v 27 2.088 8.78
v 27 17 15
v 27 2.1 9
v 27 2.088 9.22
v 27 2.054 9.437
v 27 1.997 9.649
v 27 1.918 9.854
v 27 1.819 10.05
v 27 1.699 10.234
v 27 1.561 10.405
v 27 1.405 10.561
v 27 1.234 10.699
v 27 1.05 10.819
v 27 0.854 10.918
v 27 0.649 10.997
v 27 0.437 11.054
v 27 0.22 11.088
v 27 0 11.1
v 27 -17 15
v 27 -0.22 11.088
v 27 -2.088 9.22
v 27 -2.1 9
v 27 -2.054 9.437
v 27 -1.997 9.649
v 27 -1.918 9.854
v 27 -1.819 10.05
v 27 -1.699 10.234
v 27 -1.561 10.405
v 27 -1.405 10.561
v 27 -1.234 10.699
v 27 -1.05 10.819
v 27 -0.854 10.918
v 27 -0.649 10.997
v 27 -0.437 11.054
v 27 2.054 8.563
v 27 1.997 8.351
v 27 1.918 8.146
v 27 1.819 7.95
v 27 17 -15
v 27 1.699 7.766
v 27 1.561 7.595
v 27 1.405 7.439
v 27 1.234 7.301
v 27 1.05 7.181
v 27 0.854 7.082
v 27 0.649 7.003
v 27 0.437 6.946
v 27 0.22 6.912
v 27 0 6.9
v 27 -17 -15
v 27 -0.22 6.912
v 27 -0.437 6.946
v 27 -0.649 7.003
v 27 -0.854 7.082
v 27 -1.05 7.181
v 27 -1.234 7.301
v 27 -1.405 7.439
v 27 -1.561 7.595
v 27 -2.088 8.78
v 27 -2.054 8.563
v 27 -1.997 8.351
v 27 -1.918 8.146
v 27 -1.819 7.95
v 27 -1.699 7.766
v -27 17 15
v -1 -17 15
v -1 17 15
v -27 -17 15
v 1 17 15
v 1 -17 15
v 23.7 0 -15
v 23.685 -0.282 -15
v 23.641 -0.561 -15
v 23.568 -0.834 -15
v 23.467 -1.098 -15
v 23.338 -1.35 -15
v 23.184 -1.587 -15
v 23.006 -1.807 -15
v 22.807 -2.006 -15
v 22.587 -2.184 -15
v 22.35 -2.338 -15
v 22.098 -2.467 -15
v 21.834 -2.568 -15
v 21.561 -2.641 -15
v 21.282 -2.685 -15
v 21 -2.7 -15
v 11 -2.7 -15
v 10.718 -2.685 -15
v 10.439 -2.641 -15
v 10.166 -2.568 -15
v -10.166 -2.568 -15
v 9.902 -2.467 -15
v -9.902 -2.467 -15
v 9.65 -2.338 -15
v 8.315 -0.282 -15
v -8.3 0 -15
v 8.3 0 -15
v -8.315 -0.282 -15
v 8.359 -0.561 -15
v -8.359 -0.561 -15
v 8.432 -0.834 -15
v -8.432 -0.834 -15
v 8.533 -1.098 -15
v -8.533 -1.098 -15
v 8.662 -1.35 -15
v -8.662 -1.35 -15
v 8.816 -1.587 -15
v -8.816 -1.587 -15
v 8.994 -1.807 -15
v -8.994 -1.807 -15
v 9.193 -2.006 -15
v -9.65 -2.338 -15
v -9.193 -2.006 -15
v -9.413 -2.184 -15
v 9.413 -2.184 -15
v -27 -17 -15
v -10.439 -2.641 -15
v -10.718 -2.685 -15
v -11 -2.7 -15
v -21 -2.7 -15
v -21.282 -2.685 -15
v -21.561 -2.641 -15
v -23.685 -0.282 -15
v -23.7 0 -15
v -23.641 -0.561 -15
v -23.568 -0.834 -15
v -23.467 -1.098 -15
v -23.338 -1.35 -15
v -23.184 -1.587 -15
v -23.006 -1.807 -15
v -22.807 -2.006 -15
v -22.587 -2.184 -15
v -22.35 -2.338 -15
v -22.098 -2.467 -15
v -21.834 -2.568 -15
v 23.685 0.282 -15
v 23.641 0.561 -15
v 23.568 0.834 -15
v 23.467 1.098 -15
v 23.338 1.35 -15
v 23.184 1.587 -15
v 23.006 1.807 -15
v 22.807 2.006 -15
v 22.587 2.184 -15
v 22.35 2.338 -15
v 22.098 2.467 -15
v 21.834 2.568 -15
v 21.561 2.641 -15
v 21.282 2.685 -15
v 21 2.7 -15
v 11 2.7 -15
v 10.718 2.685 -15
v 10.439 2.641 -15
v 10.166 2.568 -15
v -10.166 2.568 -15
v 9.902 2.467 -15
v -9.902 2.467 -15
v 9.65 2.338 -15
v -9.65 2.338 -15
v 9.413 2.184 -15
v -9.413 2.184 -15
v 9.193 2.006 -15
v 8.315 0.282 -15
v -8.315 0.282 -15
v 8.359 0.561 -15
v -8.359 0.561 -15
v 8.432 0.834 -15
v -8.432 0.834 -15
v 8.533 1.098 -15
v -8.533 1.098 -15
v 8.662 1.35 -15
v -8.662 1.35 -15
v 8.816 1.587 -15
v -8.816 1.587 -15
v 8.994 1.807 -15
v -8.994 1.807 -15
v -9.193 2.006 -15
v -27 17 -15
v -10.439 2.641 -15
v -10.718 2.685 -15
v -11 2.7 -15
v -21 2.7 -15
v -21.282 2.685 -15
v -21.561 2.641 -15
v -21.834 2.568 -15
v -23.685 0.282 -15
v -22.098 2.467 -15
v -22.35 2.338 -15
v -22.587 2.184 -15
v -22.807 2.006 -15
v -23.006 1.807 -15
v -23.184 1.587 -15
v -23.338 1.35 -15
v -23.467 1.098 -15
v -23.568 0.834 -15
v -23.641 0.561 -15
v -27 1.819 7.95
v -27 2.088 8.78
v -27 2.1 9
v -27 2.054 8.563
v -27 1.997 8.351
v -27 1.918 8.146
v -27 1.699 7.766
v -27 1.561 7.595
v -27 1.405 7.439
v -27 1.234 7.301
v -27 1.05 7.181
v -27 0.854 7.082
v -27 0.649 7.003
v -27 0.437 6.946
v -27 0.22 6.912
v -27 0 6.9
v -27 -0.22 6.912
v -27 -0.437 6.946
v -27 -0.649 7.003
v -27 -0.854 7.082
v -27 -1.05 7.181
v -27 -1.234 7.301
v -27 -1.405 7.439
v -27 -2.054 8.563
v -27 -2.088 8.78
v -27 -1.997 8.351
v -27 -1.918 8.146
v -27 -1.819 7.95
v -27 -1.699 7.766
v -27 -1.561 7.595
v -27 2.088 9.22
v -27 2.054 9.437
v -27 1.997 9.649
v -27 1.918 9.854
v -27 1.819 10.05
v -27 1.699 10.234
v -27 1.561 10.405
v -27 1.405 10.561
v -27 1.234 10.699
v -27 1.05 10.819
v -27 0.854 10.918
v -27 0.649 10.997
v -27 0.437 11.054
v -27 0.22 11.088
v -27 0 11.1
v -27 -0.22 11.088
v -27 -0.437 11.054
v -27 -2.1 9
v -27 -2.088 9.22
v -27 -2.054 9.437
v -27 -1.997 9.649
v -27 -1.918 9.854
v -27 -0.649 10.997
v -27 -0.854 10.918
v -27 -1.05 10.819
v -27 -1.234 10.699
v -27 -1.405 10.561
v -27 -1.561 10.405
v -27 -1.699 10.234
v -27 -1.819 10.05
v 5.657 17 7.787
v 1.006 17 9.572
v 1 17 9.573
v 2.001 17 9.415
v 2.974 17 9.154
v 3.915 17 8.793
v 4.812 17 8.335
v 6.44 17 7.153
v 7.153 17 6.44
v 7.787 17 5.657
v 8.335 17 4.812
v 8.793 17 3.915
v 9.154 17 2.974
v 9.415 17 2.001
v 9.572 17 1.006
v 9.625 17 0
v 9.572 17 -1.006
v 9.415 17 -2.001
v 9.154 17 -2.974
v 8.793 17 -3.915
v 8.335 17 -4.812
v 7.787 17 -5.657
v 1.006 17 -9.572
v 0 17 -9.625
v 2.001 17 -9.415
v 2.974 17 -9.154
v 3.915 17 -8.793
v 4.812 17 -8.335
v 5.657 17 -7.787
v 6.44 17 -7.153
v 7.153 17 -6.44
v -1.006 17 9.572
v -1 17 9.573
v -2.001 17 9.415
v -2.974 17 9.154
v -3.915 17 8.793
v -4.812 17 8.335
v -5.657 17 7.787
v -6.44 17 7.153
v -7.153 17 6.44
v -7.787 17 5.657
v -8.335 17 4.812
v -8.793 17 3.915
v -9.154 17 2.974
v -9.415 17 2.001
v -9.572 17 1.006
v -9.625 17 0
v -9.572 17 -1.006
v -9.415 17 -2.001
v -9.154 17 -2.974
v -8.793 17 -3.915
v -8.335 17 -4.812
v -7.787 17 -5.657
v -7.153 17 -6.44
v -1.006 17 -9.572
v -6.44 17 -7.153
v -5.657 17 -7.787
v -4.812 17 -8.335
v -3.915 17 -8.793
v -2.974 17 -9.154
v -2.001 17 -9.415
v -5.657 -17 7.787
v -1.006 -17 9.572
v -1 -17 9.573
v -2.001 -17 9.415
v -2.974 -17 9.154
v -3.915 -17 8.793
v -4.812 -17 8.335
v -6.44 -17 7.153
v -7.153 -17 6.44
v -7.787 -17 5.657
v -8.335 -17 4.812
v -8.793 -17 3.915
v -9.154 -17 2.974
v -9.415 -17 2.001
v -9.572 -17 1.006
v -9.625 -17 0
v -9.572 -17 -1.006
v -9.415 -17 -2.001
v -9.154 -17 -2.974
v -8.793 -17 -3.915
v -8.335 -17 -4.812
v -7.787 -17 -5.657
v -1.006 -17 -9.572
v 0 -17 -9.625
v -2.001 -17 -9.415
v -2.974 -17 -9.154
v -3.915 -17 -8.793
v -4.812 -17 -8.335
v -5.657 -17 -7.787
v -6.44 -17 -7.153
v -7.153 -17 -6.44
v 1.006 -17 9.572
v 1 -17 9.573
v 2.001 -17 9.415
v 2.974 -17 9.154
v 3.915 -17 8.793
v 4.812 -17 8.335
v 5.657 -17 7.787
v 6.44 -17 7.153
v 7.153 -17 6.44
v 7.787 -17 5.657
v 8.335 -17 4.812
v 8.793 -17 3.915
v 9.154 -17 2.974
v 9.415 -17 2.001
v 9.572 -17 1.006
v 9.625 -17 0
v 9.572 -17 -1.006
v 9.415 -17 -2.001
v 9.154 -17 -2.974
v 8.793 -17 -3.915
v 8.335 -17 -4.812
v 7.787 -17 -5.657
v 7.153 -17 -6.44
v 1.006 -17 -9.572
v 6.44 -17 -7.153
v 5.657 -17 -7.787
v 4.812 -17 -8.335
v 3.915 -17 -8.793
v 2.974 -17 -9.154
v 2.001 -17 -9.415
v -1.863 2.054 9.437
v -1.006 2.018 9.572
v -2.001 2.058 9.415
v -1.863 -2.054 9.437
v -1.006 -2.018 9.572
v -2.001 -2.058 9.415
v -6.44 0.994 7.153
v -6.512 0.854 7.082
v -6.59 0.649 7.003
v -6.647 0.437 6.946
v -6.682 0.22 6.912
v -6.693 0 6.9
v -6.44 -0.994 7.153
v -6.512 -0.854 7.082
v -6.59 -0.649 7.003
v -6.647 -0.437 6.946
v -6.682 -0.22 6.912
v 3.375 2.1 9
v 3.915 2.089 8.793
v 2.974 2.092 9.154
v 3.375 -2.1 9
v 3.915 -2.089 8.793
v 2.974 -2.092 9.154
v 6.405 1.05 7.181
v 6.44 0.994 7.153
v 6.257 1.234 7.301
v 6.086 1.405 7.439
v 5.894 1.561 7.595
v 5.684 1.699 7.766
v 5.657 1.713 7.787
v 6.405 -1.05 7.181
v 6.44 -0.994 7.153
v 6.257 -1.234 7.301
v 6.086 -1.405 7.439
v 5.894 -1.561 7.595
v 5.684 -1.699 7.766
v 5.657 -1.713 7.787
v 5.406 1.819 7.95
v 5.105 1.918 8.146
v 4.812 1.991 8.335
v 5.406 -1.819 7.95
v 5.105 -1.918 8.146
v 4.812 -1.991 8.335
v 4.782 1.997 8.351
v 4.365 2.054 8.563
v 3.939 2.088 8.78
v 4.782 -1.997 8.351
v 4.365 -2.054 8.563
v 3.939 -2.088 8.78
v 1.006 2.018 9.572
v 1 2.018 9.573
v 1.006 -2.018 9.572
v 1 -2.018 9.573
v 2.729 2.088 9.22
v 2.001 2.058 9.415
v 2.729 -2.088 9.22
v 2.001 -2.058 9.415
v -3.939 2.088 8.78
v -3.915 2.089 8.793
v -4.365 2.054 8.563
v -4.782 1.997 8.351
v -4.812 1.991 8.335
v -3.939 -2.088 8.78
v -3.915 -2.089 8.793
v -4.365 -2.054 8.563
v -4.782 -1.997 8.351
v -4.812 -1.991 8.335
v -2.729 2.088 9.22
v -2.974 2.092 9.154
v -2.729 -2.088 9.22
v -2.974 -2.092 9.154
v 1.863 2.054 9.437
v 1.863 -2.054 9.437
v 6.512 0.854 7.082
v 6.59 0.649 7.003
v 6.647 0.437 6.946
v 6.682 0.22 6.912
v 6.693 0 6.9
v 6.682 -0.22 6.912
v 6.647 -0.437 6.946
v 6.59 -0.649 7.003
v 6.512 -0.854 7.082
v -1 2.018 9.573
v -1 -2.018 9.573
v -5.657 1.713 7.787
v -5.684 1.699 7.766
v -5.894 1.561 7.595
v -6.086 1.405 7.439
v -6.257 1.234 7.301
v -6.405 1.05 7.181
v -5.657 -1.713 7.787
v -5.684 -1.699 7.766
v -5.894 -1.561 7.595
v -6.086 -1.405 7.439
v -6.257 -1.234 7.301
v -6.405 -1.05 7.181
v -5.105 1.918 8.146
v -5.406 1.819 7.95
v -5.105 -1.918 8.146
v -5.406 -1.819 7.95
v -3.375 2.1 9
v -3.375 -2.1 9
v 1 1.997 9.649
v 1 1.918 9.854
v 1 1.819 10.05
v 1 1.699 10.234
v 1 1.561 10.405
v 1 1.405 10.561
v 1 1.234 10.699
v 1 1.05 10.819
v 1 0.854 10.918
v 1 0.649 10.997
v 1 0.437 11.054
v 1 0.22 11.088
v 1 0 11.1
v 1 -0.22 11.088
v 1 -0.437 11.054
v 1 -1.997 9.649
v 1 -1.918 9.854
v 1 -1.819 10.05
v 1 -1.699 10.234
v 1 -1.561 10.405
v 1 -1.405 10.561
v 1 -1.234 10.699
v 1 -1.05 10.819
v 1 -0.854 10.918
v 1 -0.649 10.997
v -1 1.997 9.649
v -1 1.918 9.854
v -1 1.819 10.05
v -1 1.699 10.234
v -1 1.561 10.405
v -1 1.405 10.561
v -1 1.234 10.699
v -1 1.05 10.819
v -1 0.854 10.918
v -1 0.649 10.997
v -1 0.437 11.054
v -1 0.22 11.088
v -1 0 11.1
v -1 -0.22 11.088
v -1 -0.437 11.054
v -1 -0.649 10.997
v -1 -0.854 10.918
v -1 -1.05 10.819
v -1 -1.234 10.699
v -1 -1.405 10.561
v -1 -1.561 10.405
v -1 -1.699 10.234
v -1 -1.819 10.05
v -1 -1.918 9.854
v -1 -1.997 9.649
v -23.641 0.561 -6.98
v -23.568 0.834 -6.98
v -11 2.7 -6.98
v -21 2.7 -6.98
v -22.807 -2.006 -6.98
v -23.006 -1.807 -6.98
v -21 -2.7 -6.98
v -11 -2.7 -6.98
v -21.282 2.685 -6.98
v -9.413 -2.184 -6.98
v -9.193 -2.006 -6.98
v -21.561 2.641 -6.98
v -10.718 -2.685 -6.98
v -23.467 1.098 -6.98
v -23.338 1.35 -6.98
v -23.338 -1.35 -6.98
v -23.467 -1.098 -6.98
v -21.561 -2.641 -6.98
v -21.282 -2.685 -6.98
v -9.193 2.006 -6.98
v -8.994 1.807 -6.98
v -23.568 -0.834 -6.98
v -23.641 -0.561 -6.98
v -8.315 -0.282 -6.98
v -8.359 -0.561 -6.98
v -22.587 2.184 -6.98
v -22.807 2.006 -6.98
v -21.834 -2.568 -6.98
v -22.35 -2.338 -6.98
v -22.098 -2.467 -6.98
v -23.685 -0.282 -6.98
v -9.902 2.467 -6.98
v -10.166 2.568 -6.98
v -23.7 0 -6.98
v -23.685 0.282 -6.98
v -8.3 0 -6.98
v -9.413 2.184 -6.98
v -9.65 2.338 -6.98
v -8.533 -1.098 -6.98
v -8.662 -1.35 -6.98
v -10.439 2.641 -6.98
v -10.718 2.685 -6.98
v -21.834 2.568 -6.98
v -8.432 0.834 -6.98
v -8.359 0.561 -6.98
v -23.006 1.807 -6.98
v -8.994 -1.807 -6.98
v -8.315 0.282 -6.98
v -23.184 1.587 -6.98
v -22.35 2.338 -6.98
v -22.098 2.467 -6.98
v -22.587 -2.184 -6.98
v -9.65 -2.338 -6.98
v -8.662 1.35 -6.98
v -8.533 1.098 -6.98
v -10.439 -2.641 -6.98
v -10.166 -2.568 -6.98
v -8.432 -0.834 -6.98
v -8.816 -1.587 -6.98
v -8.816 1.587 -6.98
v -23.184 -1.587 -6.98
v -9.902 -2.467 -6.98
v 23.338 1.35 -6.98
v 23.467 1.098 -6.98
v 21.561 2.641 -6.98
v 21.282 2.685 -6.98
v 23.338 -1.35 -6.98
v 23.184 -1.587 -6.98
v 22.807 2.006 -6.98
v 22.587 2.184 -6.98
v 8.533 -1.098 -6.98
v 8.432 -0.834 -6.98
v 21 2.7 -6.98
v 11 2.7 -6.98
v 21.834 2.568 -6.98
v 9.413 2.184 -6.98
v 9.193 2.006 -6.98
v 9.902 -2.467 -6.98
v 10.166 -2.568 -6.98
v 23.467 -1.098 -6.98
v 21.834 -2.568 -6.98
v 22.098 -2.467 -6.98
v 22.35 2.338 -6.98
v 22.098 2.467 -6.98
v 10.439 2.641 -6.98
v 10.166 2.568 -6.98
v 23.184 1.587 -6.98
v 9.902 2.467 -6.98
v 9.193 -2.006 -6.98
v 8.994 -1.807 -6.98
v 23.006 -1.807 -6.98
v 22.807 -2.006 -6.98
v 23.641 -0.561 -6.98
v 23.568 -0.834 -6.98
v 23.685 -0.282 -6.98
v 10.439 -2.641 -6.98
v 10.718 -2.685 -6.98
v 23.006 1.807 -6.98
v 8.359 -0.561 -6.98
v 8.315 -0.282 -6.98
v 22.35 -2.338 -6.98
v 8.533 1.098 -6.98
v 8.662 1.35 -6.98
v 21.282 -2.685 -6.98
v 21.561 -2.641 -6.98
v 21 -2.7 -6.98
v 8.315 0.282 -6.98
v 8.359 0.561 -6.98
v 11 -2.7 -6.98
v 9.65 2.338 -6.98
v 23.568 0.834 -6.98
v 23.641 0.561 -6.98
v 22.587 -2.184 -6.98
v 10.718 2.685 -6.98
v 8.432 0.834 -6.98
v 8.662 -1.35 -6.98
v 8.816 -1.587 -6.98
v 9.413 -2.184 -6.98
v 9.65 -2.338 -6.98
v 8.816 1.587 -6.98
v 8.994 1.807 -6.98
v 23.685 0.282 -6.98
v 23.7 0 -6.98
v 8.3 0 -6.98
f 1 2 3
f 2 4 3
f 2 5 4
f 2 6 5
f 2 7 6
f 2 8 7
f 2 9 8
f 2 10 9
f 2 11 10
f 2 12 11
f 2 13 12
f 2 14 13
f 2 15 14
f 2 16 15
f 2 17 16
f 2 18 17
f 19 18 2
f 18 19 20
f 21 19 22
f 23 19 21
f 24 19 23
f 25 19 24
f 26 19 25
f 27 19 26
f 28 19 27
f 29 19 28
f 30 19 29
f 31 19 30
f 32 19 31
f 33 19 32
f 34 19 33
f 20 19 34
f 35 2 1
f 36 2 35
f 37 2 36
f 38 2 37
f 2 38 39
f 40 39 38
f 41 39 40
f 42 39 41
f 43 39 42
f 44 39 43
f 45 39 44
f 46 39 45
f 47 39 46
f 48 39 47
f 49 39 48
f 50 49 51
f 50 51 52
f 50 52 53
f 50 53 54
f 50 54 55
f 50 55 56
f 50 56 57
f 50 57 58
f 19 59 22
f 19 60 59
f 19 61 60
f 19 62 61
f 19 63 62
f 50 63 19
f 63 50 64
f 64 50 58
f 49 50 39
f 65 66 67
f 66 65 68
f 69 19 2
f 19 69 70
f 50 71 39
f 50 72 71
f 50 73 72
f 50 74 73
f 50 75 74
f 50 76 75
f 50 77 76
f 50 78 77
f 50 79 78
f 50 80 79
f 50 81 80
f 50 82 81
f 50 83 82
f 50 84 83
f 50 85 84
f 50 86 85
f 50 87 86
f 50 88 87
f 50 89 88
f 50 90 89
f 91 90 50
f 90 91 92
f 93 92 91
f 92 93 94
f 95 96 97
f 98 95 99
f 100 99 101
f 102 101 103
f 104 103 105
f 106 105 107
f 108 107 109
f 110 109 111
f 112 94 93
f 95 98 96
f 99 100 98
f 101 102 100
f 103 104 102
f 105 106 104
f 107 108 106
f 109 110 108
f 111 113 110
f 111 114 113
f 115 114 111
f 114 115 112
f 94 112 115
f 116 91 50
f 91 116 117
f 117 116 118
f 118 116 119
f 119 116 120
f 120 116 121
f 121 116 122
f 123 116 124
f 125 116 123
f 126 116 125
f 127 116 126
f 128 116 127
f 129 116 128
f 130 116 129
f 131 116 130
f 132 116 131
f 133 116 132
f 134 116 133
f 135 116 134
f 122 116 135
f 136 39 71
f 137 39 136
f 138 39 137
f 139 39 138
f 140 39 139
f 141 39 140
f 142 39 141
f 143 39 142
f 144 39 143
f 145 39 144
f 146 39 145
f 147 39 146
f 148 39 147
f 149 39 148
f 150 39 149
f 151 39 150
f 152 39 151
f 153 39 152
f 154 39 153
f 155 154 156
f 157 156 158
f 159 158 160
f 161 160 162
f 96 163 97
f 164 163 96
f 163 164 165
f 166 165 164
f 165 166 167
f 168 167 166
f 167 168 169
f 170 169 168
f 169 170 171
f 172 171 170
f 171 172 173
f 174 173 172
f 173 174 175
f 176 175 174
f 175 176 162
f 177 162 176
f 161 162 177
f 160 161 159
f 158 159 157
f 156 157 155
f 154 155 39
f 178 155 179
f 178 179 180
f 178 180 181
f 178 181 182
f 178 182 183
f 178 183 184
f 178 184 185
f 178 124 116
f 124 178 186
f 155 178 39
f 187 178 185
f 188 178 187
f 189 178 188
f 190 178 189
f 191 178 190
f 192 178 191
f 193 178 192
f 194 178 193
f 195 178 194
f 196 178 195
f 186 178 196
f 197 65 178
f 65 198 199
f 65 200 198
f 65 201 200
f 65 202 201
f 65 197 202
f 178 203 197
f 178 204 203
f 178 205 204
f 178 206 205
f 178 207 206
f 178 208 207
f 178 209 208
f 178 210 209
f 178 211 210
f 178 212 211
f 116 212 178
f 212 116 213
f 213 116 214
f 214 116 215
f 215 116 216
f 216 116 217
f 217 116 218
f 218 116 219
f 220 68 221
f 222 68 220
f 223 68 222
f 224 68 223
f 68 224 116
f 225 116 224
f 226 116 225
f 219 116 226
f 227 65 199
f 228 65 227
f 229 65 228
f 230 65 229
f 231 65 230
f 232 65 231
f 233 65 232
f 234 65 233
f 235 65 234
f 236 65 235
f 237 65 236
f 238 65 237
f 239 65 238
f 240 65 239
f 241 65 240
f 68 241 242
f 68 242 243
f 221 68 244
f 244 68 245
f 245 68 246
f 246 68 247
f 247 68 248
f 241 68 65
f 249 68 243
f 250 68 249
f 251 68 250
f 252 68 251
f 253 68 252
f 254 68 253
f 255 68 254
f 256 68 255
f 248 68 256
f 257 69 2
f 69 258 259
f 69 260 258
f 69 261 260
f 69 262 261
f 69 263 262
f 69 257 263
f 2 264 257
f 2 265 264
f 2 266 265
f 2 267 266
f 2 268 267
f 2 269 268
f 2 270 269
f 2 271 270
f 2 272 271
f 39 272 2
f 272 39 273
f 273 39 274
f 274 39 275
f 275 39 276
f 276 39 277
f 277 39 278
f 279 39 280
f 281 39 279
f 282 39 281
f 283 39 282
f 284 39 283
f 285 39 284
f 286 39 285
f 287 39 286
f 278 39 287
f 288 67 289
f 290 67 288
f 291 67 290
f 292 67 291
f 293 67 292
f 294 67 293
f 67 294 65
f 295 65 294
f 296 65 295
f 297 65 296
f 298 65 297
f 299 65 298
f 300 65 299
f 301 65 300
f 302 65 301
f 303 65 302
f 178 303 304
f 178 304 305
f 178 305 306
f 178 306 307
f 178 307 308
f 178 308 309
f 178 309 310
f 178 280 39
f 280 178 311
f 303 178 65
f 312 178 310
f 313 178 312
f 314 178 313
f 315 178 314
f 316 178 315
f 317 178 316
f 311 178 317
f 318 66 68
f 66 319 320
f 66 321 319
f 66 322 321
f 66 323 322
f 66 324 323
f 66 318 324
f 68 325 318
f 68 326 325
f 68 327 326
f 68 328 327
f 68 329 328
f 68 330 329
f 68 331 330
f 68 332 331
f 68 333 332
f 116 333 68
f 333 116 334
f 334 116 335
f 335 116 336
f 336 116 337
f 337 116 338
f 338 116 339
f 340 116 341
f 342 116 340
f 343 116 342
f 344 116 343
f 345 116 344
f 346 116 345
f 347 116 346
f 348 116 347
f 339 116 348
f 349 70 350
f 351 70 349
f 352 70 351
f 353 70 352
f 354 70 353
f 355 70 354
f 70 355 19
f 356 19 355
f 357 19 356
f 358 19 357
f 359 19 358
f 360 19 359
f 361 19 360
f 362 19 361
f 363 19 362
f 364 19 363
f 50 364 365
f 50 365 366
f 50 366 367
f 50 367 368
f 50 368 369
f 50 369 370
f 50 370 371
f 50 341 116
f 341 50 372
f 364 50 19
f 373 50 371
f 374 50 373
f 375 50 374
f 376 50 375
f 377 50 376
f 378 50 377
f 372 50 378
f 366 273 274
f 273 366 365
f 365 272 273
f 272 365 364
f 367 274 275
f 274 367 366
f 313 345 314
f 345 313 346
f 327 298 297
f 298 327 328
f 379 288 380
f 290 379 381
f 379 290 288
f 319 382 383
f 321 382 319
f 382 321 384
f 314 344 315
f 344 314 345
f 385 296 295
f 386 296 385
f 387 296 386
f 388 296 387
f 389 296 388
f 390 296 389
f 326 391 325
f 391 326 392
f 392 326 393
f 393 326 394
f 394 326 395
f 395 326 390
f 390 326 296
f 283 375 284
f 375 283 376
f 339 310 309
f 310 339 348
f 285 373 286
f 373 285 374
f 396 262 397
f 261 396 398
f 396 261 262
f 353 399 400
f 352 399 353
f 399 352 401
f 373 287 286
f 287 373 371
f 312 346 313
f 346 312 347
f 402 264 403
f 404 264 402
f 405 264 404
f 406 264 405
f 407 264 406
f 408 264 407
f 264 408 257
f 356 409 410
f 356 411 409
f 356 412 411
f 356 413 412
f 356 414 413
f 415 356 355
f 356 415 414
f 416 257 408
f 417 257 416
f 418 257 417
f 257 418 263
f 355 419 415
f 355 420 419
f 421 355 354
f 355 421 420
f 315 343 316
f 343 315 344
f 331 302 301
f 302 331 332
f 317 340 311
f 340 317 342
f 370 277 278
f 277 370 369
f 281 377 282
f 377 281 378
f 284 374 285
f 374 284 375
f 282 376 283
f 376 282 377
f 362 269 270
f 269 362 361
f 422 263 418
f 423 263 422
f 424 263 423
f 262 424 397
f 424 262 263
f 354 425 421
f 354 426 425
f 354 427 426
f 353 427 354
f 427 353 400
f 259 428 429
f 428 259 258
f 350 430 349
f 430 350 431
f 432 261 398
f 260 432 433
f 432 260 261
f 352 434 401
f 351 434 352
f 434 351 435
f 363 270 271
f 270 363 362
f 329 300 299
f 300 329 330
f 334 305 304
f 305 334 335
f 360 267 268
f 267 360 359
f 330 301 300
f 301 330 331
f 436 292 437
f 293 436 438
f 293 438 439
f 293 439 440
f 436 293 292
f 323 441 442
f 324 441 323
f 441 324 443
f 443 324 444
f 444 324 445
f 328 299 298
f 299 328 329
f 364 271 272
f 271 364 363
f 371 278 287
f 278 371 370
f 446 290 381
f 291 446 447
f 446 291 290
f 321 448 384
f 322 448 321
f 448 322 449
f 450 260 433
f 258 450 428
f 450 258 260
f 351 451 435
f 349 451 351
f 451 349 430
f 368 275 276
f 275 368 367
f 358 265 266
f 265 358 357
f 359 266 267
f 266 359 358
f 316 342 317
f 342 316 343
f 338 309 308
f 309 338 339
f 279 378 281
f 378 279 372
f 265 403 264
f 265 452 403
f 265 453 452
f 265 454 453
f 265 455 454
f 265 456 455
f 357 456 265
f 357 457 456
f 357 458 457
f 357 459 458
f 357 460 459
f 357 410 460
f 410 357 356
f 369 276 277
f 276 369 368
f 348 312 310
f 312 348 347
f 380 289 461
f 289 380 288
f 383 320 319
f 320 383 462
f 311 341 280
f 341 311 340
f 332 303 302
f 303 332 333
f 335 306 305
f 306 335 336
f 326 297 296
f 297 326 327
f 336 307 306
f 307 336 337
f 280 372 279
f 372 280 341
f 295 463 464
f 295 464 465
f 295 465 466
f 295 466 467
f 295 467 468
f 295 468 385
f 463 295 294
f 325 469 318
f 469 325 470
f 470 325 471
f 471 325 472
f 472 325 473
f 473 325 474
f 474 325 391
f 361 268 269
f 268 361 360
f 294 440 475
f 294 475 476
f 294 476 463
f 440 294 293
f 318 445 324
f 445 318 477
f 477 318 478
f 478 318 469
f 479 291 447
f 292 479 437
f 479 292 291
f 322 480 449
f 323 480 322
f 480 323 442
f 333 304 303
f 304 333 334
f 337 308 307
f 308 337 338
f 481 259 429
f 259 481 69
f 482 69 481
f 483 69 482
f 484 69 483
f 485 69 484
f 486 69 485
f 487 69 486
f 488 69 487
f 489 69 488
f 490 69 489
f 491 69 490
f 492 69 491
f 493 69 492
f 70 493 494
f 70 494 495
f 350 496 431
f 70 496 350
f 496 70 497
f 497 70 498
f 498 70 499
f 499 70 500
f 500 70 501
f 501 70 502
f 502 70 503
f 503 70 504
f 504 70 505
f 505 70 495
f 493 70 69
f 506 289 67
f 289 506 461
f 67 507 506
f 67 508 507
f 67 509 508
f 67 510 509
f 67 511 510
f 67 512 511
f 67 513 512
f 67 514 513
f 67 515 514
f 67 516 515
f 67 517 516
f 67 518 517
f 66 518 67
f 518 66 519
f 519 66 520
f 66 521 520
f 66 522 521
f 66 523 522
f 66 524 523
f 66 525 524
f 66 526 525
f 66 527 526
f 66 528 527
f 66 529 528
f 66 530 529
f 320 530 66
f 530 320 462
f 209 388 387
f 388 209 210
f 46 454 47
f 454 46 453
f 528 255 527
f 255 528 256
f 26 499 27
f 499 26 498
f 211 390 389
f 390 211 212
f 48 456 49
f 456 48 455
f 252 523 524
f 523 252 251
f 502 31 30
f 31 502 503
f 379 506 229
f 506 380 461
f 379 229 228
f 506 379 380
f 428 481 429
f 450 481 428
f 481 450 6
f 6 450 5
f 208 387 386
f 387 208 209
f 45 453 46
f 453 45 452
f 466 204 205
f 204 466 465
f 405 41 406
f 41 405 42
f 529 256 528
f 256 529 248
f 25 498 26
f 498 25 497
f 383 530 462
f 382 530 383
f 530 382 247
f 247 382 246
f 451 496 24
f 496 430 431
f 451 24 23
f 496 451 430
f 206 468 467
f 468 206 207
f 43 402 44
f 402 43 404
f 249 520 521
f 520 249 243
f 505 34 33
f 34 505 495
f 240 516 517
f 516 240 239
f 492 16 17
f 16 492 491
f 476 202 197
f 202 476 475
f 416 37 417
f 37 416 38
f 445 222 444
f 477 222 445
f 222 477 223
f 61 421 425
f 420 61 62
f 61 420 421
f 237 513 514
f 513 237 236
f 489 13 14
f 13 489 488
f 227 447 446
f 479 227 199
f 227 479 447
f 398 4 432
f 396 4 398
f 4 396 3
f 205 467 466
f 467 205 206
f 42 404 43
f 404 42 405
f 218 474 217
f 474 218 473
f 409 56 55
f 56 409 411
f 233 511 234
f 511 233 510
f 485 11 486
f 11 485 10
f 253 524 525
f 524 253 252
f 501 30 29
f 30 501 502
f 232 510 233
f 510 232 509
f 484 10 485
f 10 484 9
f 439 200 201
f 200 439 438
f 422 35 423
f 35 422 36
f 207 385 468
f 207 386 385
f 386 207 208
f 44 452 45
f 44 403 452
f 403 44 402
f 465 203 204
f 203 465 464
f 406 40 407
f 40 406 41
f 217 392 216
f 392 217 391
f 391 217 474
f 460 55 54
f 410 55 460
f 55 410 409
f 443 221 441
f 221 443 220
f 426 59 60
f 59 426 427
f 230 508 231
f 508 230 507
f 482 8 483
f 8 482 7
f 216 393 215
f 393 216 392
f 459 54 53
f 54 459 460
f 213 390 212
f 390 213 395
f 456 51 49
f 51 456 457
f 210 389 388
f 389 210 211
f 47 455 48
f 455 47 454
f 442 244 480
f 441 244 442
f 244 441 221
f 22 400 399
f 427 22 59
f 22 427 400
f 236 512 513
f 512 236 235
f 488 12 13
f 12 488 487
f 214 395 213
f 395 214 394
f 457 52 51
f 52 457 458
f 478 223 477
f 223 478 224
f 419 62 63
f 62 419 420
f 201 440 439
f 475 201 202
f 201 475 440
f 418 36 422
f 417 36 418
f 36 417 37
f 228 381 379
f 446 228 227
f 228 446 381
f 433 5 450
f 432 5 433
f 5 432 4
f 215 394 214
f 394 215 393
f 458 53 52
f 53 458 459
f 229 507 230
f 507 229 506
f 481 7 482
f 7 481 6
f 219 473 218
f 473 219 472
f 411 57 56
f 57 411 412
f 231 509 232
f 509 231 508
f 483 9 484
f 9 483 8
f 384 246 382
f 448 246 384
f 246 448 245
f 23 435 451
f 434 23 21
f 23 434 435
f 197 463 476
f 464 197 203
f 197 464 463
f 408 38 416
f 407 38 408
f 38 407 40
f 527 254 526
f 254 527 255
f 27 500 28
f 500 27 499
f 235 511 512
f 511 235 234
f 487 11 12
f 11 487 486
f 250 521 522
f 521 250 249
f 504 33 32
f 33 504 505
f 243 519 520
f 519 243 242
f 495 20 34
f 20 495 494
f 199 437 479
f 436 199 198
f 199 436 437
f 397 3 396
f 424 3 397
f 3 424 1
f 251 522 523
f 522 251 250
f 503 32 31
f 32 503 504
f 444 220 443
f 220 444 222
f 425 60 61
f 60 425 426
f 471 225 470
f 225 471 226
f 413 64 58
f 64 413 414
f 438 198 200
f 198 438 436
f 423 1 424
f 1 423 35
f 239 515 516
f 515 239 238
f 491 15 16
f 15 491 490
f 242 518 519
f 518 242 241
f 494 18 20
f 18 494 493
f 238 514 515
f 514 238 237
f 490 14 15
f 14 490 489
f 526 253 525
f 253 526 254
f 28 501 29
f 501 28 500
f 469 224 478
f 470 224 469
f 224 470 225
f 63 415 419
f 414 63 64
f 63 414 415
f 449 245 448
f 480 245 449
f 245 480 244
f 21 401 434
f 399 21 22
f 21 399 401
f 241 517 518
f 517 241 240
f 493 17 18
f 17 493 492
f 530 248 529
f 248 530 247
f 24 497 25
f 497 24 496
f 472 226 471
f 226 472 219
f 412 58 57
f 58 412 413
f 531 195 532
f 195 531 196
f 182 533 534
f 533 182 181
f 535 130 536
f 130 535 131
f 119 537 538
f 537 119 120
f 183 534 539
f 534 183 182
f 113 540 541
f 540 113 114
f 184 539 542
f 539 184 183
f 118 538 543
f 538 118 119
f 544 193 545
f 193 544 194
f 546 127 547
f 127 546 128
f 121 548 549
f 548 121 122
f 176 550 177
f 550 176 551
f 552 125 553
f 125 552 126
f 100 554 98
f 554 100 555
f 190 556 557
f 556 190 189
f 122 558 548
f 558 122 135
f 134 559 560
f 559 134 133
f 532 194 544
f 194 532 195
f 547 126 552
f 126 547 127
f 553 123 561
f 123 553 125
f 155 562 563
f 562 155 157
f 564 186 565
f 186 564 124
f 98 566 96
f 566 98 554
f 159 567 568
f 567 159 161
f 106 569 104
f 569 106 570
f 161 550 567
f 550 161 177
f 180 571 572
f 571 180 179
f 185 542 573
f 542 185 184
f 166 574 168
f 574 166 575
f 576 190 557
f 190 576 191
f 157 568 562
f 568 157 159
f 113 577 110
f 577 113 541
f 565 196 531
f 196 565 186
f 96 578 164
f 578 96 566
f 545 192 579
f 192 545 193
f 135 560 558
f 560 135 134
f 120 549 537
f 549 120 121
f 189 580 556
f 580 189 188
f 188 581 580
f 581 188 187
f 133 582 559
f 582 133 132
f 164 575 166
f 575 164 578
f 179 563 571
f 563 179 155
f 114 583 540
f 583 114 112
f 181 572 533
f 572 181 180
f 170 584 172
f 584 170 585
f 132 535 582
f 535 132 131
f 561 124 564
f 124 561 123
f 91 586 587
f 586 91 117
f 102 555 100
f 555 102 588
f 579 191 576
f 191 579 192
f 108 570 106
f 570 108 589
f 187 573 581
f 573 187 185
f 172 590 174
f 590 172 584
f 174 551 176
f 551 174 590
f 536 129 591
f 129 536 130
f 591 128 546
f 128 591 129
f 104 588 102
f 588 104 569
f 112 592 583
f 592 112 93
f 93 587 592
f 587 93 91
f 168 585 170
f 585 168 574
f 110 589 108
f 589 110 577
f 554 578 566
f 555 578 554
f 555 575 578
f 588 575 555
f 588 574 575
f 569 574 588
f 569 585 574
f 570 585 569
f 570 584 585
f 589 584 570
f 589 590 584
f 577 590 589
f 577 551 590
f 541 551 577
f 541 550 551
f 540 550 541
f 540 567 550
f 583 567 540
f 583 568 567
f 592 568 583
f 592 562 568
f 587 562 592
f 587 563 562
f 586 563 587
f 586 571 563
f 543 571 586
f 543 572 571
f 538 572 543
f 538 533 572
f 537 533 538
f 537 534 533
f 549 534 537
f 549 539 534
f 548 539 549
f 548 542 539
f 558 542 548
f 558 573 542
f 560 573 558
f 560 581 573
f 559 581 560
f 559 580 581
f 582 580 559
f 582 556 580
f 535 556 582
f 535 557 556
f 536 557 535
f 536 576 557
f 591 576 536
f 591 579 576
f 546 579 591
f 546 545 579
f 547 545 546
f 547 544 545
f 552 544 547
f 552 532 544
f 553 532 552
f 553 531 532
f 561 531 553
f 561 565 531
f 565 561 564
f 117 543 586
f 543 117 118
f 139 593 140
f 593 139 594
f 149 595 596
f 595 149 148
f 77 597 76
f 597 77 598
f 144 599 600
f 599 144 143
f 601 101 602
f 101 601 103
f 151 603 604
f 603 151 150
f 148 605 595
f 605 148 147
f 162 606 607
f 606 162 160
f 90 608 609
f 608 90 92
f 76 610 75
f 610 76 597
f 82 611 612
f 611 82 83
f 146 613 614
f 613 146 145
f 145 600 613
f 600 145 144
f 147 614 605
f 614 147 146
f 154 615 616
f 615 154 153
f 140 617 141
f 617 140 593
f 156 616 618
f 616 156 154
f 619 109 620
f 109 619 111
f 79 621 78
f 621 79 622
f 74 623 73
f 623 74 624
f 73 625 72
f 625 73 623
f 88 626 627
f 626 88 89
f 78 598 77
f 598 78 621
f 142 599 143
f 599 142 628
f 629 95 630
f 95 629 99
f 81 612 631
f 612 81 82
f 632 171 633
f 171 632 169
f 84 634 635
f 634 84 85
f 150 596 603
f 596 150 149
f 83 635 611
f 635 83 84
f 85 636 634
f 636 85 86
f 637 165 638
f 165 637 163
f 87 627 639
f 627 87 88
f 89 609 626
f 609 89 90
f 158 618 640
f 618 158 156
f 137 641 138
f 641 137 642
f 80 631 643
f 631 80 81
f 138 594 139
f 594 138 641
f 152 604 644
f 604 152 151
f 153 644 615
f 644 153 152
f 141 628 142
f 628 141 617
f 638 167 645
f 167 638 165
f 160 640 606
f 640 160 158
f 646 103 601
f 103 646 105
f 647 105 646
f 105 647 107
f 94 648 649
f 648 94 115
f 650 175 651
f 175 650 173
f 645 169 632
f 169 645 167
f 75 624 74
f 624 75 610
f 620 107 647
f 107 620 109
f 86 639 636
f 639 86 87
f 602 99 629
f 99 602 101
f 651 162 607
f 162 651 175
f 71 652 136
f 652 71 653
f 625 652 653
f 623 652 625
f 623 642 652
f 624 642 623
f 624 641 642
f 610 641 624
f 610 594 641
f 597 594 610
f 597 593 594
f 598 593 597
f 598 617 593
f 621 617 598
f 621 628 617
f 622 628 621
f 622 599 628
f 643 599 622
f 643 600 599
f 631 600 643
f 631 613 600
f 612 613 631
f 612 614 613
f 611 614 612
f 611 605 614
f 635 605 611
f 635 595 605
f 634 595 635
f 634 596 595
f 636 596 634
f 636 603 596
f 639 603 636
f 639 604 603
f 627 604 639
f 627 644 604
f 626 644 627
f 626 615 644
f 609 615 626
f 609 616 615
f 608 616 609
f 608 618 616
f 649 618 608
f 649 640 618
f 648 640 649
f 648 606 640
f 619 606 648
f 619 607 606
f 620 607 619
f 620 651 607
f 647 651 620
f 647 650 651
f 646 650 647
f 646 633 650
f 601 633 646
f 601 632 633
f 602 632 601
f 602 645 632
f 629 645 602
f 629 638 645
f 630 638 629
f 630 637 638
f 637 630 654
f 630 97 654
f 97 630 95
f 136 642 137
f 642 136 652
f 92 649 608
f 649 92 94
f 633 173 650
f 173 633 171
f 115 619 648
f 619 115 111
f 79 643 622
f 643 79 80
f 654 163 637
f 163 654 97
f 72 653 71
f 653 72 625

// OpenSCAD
// LM10UU split housing: split linear-bearing housing with mounting slots.
$fn = 60;
eps = 0.02;
bearing_d = 19;
body_l = 54;
body_d = 34;
body_h = 30;
slot_w = 2;
clamp_screw_d = 4.2;
mount_slot_l = 10;
mount_slot_d = 5.4;

module mount_slot(x) {
    hull() {
        translate([x - mount_slot_l / 2, 0, -body_h / 2 - eps]) cylinder(d = mount_slot_d, h = 8 + 2 * eps);
        translate([x + mount_slot_l / 2, 0, -body_h / 2 - eps]) cylinder(d = mount_slot_d, h = 8 + 2 * eps);
    }
}

difference() {
    cube([body_l, body_d, body_h], center = true);
    translate([0, -body_d / 2 - eps, 0])
        rotate([-90, 0, 0]) cylinder(d = bearing_d + 0.25, h = body_d + 2 * eps);
    translate([-slot_w / 2, -body_d / 2 - eps, 0]) cube([slot_w, body_d + 2 * eps, body_h / 2 + eps]);
    translate([-body_l / 2 - eps, 0, body_h / 2 - 6])
        rotate([0, 90, 0]) cylinder(d = clamp_screw_d, h = body_l + 2 * eps);
    mount_slot(-16);
    mount_slot(16);
}
